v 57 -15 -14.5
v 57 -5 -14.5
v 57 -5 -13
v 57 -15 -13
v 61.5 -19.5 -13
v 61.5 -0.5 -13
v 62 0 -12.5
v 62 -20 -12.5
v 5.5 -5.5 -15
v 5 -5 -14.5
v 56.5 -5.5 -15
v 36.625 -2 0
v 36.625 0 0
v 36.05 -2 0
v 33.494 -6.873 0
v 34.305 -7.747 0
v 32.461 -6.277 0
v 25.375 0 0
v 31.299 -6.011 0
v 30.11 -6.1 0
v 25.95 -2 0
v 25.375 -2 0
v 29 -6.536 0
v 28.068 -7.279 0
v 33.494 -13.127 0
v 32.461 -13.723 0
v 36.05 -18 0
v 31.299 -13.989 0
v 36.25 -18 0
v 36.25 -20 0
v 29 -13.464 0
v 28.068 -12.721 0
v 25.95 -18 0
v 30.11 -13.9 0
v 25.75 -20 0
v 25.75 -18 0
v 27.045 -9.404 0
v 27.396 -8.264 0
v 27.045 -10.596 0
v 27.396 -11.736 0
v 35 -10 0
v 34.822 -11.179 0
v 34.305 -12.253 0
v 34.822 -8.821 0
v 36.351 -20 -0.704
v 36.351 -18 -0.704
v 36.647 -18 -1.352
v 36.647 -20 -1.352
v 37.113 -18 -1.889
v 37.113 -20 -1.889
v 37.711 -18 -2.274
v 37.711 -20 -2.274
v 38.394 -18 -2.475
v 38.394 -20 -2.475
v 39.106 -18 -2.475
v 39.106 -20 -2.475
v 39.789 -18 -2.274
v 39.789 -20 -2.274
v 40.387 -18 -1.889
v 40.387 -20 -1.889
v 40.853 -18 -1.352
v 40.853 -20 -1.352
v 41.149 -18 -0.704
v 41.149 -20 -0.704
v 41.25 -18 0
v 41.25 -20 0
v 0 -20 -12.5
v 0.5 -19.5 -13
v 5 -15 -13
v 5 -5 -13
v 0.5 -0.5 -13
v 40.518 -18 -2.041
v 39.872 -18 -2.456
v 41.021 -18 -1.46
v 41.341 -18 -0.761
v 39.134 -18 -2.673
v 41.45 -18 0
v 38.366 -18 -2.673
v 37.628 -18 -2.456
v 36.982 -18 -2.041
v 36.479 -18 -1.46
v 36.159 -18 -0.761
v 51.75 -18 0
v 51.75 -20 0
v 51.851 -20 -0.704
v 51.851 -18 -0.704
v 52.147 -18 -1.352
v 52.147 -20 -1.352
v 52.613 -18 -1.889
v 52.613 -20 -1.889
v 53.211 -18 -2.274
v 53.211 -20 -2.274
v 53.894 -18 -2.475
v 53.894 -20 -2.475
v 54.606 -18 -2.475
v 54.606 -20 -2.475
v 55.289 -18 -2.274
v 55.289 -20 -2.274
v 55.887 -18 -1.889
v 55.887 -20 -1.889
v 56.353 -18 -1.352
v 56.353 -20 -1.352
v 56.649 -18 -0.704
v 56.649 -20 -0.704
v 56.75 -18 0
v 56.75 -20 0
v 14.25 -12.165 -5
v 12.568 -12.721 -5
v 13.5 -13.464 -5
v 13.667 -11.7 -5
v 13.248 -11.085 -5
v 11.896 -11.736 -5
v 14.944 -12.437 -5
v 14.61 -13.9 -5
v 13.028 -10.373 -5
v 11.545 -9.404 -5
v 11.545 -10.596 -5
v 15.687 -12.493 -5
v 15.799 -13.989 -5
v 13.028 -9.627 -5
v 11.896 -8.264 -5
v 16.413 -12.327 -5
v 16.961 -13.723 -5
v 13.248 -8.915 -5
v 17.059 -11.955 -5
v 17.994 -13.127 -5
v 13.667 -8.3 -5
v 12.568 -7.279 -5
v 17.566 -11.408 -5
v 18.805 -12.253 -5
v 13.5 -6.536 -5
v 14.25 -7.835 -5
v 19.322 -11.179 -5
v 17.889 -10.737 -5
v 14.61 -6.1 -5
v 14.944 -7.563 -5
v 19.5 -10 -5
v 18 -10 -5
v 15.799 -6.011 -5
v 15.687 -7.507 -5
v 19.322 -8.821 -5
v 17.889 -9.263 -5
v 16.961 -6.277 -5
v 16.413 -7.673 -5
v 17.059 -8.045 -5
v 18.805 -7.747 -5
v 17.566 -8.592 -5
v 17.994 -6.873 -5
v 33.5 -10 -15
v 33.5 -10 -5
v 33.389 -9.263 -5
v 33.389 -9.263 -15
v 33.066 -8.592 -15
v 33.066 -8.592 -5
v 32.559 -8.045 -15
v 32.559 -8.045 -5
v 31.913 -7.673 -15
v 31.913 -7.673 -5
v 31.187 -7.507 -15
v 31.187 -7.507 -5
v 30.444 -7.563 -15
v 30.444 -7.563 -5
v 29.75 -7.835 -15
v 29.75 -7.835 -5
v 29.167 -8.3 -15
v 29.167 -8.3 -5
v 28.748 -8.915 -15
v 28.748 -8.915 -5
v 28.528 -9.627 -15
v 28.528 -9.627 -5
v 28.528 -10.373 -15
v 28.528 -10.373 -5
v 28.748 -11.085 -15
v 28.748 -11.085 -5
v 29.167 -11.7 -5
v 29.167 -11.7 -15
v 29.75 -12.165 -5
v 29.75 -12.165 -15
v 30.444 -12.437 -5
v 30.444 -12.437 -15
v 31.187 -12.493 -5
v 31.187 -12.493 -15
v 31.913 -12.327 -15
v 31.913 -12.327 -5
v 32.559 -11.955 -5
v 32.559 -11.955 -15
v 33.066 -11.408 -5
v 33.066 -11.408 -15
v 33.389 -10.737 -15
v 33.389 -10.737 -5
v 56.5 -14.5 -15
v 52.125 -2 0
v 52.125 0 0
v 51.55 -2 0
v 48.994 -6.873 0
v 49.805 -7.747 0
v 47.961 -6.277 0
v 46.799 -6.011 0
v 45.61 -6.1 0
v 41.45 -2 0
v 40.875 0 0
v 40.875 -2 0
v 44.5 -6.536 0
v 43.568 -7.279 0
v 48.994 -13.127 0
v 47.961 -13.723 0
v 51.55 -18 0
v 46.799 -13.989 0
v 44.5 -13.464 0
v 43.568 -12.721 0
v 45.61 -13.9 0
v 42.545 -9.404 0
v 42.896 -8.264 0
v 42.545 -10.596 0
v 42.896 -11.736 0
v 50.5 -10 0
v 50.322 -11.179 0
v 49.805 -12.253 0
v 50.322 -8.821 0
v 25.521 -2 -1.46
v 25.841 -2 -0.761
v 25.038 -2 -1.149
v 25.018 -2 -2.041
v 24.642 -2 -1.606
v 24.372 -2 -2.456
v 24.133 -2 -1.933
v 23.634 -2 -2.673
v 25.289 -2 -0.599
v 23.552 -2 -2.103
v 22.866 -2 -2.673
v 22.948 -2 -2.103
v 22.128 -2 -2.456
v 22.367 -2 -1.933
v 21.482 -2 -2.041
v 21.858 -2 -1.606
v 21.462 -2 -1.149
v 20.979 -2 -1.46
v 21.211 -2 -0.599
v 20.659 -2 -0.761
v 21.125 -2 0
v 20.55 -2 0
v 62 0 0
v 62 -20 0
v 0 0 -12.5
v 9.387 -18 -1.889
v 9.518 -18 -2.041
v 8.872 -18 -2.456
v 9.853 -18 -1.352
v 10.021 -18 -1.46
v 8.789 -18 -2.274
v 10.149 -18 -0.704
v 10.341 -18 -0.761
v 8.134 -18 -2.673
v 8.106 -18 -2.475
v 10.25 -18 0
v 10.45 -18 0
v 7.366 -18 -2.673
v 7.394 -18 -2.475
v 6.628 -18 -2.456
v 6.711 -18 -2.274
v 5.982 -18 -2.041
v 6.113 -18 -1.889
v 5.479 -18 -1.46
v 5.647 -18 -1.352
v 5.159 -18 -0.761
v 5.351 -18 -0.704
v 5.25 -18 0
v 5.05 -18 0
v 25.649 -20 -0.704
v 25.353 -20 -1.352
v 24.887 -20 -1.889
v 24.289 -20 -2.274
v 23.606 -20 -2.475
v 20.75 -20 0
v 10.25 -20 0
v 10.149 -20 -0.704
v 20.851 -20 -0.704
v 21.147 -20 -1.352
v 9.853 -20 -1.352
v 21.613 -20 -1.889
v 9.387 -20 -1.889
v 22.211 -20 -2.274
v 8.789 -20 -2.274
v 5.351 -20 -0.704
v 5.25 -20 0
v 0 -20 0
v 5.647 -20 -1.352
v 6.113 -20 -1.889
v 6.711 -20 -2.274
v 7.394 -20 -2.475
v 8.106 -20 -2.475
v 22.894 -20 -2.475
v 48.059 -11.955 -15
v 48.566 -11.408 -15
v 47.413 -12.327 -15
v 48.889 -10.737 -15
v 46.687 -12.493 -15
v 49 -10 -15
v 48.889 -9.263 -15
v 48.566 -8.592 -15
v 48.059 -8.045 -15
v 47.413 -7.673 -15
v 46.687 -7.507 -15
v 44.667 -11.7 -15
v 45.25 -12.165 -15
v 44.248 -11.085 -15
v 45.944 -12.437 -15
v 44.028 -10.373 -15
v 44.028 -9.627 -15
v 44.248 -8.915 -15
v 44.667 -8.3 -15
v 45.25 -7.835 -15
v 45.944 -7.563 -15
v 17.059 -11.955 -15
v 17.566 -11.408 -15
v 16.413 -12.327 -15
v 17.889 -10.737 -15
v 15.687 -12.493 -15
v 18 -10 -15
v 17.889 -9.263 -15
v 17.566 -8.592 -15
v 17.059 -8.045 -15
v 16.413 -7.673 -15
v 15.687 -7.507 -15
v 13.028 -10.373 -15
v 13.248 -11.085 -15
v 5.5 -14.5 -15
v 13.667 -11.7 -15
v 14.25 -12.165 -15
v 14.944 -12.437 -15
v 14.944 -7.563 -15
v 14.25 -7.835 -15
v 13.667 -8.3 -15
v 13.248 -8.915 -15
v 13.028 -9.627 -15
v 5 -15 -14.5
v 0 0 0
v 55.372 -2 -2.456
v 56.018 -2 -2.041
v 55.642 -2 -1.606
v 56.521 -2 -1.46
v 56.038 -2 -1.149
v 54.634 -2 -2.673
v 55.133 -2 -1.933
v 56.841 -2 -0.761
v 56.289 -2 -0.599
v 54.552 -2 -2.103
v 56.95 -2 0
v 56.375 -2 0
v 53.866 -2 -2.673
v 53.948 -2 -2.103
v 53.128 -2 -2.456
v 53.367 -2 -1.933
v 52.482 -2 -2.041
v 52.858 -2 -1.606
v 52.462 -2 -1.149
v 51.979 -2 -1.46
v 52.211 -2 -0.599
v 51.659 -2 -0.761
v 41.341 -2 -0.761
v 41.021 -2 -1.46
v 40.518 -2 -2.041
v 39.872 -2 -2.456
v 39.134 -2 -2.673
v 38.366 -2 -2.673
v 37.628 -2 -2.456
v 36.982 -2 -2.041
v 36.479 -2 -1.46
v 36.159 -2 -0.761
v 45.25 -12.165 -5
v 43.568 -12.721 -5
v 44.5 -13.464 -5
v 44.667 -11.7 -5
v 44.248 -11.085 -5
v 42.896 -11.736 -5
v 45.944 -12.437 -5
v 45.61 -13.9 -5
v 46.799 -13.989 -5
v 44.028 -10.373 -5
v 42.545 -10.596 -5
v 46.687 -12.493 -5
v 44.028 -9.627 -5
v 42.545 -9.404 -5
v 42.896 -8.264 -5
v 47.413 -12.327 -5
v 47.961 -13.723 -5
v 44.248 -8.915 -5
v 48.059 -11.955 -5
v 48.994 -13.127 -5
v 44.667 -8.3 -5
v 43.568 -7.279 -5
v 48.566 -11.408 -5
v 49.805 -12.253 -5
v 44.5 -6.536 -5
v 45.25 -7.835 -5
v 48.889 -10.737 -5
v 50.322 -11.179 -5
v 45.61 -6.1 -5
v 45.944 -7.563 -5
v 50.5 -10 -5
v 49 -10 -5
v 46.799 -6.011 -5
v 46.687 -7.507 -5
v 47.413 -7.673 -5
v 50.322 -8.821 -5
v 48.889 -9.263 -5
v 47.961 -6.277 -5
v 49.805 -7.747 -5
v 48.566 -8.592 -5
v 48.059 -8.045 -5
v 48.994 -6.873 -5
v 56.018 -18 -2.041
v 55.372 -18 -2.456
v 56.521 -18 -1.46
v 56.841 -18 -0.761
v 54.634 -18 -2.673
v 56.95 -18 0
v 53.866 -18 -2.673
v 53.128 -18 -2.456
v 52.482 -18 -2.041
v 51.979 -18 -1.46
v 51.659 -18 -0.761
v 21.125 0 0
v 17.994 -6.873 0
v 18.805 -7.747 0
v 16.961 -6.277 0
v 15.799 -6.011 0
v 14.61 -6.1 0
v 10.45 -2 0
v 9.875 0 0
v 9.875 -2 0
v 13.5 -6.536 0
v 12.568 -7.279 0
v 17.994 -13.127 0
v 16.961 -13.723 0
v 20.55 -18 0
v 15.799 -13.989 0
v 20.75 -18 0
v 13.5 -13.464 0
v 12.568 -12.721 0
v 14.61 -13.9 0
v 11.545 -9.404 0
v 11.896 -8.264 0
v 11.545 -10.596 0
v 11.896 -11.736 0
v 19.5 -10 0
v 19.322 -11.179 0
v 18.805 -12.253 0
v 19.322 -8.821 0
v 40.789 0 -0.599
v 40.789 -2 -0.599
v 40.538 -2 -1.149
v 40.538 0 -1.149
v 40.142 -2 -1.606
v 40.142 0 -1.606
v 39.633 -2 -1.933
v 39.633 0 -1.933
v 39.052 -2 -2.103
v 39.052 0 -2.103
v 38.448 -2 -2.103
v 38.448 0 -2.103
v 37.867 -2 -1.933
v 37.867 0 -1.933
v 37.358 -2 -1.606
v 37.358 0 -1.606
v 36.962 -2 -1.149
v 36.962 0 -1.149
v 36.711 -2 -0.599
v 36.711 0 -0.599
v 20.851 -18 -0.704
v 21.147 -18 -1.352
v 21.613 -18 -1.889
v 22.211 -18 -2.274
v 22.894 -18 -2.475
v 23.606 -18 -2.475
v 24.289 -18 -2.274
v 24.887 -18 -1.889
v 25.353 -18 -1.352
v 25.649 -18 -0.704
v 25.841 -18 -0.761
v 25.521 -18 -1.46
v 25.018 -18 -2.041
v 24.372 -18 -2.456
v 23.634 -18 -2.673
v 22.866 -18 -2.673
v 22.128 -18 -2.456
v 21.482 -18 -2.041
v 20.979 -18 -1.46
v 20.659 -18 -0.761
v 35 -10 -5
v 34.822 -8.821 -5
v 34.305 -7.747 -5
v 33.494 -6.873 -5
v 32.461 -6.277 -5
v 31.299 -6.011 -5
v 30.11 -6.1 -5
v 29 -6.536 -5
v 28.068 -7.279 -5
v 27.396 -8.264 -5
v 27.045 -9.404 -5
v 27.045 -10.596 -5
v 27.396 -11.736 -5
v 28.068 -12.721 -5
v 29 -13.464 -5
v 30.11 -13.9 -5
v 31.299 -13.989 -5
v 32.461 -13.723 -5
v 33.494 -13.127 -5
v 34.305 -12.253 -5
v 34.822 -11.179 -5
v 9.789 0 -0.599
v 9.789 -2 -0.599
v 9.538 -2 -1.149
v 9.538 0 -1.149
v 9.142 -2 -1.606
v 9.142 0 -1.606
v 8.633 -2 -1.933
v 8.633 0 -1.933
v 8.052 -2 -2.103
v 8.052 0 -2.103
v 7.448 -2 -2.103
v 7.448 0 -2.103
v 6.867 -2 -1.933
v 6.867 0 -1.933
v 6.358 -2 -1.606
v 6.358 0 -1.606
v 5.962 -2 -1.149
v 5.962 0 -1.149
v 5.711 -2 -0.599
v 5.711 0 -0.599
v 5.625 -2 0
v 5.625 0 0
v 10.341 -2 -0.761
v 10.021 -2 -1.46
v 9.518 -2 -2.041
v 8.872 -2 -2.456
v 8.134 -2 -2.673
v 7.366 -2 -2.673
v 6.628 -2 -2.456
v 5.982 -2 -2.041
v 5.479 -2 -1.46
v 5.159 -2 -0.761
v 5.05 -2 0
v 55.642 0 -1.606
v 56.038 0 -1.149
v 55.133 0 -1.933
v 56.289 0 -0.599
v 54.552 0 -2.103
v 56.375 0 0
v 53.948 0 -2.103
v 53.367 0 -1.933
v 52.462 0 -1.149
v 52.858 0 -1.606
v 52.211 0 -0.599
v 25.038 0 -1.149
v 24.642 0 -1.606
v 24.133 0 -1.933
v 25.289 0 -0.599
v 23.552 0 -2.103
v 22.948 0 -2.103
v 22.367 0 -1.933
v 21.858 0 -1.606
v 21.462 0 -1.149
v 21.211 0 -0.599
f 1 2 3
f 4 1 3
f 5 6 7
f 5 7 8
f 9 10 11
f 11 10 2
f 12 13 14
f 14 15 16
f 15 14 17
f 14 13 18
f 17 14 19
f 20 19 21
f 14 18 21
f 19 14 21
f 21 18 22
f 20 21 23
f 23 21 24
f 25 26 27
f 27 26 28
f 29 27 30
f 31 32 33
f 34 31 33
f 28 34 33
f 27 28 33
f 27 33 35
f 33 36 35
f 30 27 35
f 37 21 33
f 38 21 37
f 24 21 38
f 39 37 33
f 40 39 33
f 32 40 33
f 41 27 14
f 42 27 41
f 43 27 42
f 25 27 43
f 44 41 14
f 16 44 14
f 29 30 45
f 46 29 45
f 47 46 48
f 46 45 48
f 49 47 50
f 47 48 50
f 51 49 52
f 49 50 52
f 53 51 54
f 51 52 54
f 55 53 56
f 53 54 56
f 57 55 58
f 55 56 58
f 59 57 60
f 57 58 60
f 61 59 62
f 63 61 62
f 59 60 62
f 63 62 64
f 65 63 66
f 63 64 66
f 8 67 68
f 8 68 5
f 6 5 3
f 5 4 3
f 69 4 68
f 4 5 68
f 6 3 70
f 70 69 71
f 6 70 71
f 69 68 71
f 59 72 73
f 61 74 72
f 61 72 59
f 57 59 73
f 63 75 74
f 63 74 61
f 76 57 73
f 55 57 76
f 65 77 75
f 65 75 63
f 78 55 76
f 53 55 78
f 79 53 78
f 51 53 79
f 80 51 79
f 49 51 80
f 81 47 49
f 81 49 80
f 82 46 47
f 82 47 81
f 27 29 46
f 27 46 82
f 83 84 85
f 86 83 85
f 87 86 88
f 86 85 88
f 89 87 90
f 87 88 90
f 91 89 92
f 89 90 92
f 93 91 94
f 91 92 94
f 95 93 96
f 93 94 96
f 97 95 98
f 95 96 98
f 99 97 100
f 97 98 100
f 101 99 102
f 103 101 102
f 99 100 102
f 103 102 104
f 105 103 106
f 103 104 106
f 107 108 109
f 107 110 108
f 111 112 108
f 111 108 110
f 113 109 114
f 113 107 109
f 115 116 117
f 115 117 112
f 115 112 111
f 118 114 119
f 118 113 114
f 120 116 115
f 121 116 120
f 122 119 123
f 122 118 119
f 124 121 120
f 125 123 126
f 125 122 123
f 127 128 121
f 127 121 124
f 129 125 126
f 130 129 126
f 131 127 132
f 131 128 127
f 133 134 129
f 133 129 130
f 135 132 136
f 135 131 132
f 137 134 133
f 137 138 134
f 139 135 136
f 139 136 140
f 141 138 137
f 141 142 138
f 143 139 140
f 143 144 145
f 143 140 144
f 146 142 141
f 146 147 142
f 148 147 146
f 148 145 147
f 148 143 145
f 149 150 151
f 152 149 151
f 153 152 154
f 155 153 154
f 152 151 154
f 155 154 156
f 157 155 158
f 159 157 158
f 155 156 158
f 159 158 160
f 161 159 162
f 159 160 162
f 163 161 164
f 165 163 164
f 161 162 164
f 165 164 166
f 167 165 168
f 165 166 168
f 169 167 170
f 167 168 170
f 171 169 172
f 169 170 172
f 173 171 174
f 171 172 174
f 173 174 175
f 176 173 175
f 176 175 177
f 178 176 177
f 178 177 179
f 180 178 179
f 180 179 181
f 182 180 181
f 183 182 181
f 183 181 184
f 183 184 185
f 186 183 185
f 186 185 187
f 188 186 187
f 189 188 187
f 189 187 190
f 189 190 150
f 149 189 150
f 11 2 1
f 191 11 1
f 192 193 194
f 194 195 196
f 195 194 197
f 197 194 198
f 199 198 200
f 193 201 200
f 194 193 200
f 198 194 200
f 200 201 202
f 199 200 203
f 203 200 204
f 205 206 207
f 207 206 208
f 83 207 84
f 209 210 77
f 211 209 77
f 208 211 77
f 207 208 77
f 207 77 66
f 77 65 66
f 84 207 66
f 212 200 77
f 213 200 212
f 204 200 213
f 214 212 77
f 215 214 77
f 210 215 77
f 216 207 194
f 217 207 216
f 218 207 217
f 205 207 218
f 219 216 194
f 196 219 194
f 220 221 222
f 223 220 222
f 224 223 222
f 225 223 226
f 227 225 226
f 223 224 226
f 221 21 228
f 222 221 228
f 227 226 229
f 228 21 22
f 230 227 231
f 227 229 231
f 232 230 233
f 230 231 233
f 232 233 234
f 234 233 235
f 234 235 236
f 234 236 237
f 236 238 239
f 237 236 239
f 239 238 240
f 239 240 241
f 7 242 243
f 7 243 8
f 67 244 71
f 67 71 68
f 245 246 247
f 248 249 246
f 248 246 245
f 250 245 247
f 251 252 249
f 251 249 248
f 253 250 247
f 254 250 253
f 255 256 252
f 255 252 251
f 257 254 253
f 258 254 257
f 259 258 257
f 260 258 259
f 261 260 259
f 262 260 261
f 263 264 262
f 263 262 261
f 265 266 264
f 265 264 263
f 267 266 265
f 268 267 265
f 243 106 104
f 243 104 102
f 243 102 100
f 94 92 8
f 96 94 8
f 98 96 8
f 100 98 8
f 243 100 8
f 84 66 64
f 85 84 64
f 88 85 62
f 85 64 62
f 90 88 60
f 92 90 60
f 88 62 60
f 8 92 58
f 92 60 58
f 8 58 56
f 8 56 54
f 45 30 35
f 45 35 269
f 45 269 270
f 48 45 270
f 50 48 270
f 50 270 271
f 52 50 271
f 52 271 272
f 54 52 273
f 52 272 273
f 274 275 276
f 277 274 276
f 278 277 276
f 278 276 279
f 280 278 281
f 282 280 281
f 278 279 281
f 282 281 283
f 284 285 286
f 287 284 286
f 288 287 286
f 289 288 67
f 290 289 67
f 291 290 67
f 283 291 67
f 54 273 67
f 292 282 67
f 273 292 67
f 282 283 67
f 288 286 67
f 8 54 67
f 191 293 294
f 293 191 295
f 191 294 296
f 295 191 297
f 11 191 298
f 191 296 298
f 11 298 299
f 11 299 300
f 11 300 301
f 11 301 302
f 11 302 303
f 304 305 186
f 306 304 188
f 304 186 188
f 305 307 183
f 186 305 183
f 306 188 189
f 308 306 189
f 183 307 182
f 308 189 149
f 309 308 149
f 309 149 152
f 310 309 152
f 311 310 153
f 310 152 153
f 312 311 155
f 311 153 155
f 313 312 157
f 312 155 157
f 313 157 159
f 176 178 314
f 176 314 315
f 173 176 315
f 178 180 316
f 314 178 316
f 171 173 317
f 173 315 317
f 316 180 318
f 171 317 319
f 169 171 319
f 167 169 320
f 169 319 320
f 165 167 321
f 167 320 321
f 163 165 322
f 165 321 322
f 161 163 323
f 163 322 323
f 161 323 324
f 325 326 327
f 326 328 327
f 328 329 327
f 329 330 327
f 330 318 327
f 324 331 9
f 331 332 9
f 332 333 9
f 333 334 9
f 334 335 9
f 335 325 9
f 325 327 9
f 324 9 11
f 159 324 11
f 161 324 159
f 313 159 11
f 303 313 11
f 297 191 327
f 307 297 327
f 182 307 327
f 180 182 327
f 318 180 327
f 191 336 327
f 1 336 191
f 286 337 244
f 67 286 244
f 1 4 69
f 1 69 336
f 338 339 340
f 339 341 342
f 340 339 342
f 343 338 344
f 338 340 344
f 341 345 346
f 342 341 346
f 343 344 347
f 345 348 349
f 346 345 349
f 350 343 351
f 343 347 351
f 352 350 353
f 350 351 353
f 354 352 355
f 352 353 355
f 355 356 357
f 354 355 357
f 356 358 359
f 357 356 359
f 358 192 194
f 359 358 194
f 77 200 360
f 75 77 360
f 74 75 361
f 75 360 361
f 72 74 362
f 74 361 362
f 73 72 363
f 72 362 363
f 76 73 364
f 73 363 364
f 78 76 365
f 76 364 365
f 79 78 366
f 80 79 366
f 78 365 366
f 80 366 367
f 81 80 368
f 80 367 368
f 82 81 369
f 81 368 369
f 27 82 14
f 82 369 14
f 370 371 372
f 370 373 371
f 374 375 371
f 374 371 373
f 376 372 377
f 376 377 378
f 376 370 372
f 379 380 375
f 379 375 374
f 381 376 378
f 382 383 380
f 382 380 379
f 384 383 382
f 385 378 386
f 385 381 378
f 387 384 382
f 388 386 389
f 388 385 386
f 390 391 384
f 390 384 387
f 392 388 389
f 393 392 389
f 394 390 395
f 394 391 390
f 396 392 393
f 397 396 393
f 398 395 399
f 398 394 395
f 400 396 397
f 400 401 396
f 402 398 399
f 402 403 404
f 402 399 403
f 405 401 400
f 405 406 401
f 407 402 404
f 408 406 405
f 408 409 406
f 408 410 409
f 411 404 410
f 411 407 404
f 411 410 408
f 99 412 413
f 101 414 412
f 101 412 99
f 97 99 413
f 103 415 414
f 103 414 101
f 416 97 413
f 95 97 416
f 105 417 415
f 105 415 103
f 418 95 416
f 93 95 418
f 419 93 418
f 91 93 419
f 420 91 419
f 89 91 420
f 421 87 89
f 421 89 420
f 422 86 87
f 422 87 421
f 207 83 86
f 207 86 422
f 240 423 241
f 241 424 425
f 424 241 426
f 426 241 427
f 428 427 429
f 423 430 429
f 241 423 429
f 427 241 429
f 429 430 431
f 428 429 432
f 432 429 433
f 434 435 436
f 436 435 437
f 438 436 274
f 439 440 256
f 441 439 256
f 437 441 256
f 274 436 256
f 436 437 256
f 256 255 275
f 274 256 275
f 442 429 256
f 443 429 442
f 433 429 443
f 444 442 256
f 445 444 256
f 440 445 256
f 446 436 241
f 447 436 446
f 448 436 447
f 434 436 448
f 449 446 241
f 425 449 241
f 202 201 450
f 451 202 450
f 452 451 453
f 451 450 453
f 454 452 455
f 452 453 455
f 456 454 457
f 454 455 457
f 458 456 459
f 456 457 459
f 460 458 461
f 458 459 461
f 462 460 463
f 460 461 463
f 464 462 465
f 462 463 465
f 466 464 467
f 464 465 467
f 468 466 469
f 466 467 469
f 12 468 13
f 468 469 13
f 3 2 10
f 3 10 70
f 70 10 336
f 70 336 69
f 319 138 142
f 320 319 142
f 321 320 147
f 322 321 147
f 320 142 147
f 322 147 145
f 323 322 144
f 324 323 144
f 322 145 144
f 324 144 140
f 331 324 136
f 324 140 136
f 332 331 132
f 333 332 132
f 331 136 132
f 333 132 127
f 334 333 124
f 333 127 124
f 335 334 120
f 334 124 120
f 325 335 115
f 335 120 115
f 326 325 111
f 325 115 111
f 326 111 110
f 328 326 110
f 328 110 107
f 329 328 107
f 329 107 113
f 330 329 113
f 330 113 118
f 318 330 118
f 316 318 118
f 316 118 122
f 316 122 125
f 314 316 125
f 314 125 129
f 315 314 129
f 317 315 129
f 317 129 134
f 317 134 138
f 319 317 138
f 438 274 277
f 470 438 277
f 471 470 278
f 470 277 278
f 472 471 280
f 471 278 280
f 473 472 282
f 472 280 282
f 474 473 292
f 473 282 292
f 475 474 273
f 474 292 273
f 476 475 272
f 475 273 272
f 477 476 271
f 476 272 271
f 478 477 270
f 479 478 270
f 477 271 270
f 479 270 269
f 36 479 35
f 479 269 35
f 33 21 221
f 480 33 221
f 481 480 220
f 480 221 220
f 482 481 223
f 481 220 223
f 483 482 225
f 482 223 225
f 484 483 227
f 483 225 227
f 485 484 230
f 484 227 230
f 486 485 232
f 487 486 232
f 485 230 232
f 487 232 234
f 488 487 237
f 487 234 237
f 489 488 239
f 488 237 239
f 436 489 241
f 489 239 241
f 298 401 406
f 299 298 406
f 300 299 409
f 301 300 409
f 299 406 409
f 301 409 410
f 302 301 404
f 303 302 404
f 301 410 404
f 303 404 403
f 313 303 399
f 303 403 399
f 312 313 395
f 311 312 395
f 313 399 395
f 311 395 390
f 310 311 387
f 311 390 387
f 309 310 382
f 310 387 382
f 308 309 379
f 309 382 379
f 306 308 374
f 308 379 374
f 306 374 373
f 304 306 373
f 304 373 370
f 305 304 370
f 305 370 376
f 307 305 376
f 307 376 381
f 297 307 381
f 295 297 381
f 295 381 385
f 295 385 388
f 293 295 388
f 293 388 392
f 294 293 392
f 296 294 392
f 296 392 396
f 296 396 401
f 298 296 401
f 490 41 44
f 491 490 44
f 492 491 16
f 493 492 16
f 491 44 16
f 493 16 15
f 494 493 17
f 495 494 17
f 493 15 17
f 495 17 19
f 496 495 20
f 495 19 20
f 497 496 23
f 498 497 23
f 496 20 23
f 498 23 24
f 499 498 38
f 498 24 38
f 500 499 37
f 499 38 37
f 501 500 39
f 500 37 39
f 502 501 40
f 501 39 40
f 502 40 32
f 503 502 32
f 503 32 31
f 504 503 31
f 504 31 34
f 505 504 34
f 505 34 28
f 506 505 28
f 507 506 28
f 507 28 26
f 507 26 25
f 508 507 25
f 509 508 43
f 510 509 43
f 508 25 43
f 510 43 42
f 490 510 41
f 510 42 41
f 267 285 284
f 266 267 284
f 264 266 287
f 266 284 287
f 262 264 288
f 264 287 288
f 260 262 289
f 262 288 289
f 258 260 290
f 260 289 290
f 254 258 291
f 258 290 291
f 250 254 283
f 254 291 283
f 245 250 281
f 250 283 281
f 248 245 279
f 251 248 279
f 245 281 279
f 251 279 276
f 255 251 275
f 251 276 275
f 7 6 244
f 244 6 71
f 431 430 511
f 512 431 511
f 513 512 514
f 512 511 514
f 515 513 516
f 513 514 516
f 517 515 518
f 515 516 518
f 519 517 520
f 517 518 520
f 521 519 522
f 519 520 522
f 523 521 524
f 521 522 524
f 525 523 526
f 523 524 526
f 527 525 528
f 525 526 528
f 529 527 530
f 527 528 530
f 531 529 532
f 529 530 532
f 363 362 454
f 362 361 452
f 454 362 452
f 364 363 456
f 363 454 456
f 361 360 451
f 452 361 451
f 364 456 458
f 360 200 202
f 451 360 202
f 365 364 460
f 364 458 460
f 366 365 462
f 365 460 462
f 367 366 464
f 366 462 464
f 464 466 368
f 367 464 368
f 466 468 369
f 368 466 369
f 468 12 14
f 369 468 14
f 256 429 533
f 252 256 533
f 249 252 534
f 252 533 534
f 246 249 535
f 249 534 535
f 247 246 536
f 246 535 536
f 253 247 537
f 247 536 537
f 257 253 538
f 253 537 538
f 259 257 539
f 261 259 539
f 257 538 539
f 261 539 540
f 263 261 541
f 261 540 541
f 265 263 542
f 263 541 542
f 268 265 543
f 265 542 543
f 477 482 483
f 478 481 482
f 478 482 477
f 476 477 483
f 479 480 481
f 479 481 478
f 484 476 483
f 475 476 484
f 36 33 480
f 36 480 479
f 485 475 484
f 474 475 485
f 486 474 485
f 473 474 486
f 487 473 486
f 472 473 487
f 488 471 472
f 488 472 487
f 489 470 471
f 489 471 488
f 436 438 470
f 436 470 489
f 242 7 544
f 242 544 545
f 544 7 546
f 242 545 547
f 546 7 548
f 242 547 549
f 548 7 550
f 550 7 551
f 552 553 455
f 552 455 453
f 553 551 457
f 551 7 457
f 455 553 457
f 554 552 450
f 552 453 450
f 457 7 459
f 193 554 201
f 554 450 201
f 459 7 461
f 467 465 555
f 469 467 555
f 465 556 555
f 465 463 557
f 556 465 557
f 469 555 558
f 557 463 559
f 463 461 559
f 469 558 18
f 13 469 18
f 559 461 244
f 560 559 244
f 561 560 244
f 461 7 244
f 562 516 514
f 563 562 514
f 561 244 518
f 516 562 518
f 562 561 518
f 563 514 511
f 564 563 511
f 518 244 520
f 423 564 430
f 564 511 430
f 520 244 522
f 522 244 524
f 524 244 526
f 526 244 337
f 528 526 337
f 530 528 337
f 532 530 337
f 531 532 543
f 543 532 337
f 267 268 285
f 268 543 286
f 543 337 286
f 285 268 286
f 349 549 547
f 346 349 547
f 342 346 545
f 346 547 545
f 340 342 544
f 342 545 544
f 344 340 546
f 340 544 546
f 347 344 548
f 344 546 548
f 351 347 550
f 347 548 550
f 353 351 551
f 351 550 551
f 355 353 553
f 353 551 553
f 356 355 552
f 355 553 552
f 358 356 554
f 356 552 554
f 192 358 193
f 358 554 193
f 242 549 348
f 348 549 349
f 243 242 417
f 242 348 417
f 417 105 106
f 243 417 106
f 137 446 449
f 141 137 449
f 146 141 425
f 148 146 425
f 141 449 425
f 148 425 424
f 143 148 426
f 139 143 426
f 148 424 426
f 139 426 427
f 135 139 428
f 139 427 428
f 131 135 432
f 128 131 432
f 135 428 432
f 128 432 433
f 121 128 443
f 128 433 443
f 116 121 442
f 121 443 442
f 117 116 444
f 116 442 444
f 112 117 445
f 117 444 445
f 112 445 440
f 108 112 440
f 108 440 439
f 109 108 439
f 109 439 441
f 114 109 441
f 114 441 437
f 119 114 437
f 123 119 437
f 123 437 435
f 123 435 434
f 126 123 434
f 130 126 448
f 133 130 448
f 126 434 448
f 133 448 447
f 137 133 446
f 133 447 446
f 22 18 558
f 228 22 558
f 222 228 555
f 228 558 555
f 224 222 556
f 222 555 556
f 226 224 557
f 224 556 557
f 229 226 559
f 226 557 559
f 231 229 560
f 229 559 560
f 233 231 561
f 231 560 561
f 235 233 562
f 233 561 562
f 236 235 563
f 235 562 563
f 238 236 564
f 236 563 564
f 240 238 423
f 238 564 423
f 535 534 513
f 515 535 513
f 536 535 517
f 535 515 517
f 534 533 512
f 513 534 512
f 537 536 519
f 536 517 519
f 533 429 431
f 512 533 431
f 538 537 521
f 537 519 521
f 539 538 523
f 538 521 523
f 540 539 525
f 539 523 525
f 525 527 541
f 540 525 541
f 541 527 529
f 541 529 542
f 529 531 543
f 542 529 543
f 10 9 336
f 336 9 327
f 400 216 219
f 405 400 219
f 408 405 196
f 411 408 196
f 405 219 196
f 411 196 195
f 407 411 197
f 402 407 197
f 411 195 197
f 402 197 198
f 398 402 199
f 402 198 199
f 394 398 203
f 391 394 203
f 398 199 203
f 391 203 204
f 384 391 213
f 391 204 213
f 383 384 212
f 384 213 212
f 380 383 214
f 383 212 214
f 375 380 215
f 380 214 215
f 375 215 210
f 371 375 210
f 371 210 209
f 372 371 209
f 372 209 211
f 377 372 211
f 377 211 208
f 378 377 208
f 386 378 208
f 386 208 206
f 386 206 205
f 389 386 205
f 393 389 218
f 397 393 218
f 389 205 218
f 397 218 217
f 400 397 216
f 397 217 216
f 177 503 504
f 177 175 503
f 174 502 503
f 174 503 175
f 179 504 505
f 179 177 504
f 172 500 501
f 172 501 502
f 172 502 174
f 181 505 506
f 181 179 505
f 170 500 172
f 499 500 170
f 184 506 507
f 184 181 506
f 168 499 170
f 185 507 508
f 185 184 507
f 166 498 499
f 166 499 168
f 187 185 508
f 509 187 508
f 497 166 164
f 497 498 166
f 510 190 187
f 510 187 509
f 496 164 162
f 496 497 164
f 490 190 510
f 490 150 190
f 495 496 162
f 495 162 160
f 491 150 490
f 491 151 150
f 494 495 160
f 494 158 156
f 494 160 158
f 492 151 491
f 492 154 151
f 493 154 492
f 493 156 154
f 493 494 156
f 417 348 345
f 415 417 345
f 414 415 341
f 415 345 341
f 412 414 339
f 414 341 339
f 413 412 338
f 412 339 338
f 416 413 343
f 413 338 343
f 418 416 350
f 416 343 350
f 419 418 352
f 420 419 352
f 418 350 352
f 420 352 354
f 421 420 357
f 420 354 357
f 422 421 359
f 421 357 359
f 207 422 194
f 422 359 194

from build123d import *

# Parameters (mm, degrees)
WYCI_GNI_CIE1_DEPTH        = 62
SZKIC2_R                   = 2.125
WYTNIJ_WYCI_GNI_CIE1_DEPTH = 21
SZKIC3_R                   = 2.7
WYTNIJ_WYCI_GNI_CIE2_DEPTH = 16
SZKIC4_W                   = 5
SZKIC4_H                   = 2
WYTNIJ_WYCI_GNI_CIE3_DEPTH = 21
SFAZOWANIE1_SIZE           = 0.5
SZKIC5_R                   = 2.5
WYTNIJ_WYCI_GNI_CIE4_DEPTH = 16
SZKIC6_R                   = 4
WYTNIJ_WYCI_GNI_CIE5_DEPTH = 5
SZKIC7_R                   = 2.5
WYTNIJ_WYCI_GNI_CIE6_DEPTH = 10


with BuildPart() as part:
    # Szkic1 → Wyciągnięcie1 (new body)
    with BuildSketch(Plane(origin=(0, 0, 0), x_dir=(0, 0, -1), z_dir=(1, 0, 0))):
        Polygon((0, 0), (0, -20), (13, -20), (13, -15), (15, -15), (15, -5), (13, -5), (13, 0), align=None)
    extrude(amount=WYCI_GNI_CIE1_DEPTH)

    # Szkic2 → Wytnij-wyciągnięcie1 (cut, through all)
    with BuildSketch(Plane(origin=(0, 0, 0), x_dir=(-1, 0, 0), z_dir=(0, 1, 0))):
        with Locations((-7.75, 0)):
            Circle(SZKIC2_R)
        with Locations((-23.25, 0)):
            Circle(SZKIC2_R)
        with Locations((-38.75, 0)):
            Circle(SZKIC2_R)
        with Locations((-54.25, 0)):
            Circle(SZKIC2_R)
    extrude(amount=-WYTNIJ_WYCI_GNI_CIE1_DEPTH, mode=Mode.SUBTRACT)

    # Szkic3 → Wytnij-wyciągnięcie2 (cut)
    with BuildSketch(Plane(origin=(0, -2, 0), x_dir=(-1, 0, 0), z_dir=(0, 1, 0))):
        with Locations((-7.75, 0)):
            Circle(SZKIC3_R)
        with Locations((-23.25, 0)):
            Circle(SZKIC3_R)
        with Locations((-38.75, 0)):
            Circle(SZKIC3_R)
        with Locations((-54.25, 0)):
            Circle(SZKIC3_R)
    extrude(amount=-WYTNIJ_WYCI_GNI_CIE2_DEPTH, mode=Mode.SUBTRACT)

    # Szkic4 → Wytnij-wyciągnięcie3 (cut, through all)
    with BuildSketch(Plane(origin=(0, 0, 0), x_dir=(-1, 0, 0), z_dir=(0, 1, 0))):
        with Locations((-59.5, -14)):
            Rectangle(SZKIC4_W, SZKIC4_H)
        with Locations((-2.5, -14)):
            Rectangle(SZKIC4_W, SZKIC4_H)
    extrude(amount=-WYTNIJ_WYCI_GNI_CIE3_DEPTH, mode=Mode.SUBTRACT)

    # Sfazowanie1
    sfazowanie1_edges = [part.edges().sort_by_distance(p)[0] for p in [
        (31, -5, -15),
        (31, -15, -15),
        (57, -10, -15),
        (31, 0, -13),
        (62, -10, -13),
        (31, -20, -13),
        (5, -10, -15),
        (0, -10, -13),
    ]]
    chamfer(sfazowanie1_edges, length=SFAZOWANIE1_SIZE)

    # Szkic5 → Wytnij-wyciągnięcie4 (cut, through all)
    with BuildSketch(Plane.XY):
        with Locations((31, -10)):
            Circle(SZKIC5_R)
        with Locations((46.5, -10)):
            Circle(SZKIC5_R)
        with Locations((15.5, -10)):
            Circle(SZKIC5_R)
    extrude(amount=-WYTNIJ_WYCI_GNI_CIE4_DEPTH, mode=Mode.SUBTRACT)

    # Szkic6 → Wytnij-wyciągnięcie5 (cut)
    with BuildSketch(Plane.XY):
        with Locations((46.5, -10)):
            Circle(SZKIC6_R)
        with Locations((31, -10)):
            Circle(SZKIC6_R)
        with Locations((15.5, -10)):
            Circle(SZKIC6_R)
    extrude(amount=-WYTNIJ_WYCI_GNI_CIE5_DEPTH, mode=Mode.SUBTRACT)

    # Szkic7 → Wytnij-wyciągnięcie6 (cut)
    with BuildSketch(Plane.XZ.offset(20)):
        with Locations((7.75, 0)):
            Circle(SZKIC7_R)
        with Locations((23.25, 0)):
            Circle(SZKIC7_R)
        with Locations((38.75, 0)):
            Circle(SZKIC7_R)
        with Locations((54.25, 0)):
            Circle(SZKIC7_R)
    extrude(amount=-WYTNIJ_WYCI_GNI_CIE6_DEPTH, mode=Mode.SUBTRACT)


solid = part.part
